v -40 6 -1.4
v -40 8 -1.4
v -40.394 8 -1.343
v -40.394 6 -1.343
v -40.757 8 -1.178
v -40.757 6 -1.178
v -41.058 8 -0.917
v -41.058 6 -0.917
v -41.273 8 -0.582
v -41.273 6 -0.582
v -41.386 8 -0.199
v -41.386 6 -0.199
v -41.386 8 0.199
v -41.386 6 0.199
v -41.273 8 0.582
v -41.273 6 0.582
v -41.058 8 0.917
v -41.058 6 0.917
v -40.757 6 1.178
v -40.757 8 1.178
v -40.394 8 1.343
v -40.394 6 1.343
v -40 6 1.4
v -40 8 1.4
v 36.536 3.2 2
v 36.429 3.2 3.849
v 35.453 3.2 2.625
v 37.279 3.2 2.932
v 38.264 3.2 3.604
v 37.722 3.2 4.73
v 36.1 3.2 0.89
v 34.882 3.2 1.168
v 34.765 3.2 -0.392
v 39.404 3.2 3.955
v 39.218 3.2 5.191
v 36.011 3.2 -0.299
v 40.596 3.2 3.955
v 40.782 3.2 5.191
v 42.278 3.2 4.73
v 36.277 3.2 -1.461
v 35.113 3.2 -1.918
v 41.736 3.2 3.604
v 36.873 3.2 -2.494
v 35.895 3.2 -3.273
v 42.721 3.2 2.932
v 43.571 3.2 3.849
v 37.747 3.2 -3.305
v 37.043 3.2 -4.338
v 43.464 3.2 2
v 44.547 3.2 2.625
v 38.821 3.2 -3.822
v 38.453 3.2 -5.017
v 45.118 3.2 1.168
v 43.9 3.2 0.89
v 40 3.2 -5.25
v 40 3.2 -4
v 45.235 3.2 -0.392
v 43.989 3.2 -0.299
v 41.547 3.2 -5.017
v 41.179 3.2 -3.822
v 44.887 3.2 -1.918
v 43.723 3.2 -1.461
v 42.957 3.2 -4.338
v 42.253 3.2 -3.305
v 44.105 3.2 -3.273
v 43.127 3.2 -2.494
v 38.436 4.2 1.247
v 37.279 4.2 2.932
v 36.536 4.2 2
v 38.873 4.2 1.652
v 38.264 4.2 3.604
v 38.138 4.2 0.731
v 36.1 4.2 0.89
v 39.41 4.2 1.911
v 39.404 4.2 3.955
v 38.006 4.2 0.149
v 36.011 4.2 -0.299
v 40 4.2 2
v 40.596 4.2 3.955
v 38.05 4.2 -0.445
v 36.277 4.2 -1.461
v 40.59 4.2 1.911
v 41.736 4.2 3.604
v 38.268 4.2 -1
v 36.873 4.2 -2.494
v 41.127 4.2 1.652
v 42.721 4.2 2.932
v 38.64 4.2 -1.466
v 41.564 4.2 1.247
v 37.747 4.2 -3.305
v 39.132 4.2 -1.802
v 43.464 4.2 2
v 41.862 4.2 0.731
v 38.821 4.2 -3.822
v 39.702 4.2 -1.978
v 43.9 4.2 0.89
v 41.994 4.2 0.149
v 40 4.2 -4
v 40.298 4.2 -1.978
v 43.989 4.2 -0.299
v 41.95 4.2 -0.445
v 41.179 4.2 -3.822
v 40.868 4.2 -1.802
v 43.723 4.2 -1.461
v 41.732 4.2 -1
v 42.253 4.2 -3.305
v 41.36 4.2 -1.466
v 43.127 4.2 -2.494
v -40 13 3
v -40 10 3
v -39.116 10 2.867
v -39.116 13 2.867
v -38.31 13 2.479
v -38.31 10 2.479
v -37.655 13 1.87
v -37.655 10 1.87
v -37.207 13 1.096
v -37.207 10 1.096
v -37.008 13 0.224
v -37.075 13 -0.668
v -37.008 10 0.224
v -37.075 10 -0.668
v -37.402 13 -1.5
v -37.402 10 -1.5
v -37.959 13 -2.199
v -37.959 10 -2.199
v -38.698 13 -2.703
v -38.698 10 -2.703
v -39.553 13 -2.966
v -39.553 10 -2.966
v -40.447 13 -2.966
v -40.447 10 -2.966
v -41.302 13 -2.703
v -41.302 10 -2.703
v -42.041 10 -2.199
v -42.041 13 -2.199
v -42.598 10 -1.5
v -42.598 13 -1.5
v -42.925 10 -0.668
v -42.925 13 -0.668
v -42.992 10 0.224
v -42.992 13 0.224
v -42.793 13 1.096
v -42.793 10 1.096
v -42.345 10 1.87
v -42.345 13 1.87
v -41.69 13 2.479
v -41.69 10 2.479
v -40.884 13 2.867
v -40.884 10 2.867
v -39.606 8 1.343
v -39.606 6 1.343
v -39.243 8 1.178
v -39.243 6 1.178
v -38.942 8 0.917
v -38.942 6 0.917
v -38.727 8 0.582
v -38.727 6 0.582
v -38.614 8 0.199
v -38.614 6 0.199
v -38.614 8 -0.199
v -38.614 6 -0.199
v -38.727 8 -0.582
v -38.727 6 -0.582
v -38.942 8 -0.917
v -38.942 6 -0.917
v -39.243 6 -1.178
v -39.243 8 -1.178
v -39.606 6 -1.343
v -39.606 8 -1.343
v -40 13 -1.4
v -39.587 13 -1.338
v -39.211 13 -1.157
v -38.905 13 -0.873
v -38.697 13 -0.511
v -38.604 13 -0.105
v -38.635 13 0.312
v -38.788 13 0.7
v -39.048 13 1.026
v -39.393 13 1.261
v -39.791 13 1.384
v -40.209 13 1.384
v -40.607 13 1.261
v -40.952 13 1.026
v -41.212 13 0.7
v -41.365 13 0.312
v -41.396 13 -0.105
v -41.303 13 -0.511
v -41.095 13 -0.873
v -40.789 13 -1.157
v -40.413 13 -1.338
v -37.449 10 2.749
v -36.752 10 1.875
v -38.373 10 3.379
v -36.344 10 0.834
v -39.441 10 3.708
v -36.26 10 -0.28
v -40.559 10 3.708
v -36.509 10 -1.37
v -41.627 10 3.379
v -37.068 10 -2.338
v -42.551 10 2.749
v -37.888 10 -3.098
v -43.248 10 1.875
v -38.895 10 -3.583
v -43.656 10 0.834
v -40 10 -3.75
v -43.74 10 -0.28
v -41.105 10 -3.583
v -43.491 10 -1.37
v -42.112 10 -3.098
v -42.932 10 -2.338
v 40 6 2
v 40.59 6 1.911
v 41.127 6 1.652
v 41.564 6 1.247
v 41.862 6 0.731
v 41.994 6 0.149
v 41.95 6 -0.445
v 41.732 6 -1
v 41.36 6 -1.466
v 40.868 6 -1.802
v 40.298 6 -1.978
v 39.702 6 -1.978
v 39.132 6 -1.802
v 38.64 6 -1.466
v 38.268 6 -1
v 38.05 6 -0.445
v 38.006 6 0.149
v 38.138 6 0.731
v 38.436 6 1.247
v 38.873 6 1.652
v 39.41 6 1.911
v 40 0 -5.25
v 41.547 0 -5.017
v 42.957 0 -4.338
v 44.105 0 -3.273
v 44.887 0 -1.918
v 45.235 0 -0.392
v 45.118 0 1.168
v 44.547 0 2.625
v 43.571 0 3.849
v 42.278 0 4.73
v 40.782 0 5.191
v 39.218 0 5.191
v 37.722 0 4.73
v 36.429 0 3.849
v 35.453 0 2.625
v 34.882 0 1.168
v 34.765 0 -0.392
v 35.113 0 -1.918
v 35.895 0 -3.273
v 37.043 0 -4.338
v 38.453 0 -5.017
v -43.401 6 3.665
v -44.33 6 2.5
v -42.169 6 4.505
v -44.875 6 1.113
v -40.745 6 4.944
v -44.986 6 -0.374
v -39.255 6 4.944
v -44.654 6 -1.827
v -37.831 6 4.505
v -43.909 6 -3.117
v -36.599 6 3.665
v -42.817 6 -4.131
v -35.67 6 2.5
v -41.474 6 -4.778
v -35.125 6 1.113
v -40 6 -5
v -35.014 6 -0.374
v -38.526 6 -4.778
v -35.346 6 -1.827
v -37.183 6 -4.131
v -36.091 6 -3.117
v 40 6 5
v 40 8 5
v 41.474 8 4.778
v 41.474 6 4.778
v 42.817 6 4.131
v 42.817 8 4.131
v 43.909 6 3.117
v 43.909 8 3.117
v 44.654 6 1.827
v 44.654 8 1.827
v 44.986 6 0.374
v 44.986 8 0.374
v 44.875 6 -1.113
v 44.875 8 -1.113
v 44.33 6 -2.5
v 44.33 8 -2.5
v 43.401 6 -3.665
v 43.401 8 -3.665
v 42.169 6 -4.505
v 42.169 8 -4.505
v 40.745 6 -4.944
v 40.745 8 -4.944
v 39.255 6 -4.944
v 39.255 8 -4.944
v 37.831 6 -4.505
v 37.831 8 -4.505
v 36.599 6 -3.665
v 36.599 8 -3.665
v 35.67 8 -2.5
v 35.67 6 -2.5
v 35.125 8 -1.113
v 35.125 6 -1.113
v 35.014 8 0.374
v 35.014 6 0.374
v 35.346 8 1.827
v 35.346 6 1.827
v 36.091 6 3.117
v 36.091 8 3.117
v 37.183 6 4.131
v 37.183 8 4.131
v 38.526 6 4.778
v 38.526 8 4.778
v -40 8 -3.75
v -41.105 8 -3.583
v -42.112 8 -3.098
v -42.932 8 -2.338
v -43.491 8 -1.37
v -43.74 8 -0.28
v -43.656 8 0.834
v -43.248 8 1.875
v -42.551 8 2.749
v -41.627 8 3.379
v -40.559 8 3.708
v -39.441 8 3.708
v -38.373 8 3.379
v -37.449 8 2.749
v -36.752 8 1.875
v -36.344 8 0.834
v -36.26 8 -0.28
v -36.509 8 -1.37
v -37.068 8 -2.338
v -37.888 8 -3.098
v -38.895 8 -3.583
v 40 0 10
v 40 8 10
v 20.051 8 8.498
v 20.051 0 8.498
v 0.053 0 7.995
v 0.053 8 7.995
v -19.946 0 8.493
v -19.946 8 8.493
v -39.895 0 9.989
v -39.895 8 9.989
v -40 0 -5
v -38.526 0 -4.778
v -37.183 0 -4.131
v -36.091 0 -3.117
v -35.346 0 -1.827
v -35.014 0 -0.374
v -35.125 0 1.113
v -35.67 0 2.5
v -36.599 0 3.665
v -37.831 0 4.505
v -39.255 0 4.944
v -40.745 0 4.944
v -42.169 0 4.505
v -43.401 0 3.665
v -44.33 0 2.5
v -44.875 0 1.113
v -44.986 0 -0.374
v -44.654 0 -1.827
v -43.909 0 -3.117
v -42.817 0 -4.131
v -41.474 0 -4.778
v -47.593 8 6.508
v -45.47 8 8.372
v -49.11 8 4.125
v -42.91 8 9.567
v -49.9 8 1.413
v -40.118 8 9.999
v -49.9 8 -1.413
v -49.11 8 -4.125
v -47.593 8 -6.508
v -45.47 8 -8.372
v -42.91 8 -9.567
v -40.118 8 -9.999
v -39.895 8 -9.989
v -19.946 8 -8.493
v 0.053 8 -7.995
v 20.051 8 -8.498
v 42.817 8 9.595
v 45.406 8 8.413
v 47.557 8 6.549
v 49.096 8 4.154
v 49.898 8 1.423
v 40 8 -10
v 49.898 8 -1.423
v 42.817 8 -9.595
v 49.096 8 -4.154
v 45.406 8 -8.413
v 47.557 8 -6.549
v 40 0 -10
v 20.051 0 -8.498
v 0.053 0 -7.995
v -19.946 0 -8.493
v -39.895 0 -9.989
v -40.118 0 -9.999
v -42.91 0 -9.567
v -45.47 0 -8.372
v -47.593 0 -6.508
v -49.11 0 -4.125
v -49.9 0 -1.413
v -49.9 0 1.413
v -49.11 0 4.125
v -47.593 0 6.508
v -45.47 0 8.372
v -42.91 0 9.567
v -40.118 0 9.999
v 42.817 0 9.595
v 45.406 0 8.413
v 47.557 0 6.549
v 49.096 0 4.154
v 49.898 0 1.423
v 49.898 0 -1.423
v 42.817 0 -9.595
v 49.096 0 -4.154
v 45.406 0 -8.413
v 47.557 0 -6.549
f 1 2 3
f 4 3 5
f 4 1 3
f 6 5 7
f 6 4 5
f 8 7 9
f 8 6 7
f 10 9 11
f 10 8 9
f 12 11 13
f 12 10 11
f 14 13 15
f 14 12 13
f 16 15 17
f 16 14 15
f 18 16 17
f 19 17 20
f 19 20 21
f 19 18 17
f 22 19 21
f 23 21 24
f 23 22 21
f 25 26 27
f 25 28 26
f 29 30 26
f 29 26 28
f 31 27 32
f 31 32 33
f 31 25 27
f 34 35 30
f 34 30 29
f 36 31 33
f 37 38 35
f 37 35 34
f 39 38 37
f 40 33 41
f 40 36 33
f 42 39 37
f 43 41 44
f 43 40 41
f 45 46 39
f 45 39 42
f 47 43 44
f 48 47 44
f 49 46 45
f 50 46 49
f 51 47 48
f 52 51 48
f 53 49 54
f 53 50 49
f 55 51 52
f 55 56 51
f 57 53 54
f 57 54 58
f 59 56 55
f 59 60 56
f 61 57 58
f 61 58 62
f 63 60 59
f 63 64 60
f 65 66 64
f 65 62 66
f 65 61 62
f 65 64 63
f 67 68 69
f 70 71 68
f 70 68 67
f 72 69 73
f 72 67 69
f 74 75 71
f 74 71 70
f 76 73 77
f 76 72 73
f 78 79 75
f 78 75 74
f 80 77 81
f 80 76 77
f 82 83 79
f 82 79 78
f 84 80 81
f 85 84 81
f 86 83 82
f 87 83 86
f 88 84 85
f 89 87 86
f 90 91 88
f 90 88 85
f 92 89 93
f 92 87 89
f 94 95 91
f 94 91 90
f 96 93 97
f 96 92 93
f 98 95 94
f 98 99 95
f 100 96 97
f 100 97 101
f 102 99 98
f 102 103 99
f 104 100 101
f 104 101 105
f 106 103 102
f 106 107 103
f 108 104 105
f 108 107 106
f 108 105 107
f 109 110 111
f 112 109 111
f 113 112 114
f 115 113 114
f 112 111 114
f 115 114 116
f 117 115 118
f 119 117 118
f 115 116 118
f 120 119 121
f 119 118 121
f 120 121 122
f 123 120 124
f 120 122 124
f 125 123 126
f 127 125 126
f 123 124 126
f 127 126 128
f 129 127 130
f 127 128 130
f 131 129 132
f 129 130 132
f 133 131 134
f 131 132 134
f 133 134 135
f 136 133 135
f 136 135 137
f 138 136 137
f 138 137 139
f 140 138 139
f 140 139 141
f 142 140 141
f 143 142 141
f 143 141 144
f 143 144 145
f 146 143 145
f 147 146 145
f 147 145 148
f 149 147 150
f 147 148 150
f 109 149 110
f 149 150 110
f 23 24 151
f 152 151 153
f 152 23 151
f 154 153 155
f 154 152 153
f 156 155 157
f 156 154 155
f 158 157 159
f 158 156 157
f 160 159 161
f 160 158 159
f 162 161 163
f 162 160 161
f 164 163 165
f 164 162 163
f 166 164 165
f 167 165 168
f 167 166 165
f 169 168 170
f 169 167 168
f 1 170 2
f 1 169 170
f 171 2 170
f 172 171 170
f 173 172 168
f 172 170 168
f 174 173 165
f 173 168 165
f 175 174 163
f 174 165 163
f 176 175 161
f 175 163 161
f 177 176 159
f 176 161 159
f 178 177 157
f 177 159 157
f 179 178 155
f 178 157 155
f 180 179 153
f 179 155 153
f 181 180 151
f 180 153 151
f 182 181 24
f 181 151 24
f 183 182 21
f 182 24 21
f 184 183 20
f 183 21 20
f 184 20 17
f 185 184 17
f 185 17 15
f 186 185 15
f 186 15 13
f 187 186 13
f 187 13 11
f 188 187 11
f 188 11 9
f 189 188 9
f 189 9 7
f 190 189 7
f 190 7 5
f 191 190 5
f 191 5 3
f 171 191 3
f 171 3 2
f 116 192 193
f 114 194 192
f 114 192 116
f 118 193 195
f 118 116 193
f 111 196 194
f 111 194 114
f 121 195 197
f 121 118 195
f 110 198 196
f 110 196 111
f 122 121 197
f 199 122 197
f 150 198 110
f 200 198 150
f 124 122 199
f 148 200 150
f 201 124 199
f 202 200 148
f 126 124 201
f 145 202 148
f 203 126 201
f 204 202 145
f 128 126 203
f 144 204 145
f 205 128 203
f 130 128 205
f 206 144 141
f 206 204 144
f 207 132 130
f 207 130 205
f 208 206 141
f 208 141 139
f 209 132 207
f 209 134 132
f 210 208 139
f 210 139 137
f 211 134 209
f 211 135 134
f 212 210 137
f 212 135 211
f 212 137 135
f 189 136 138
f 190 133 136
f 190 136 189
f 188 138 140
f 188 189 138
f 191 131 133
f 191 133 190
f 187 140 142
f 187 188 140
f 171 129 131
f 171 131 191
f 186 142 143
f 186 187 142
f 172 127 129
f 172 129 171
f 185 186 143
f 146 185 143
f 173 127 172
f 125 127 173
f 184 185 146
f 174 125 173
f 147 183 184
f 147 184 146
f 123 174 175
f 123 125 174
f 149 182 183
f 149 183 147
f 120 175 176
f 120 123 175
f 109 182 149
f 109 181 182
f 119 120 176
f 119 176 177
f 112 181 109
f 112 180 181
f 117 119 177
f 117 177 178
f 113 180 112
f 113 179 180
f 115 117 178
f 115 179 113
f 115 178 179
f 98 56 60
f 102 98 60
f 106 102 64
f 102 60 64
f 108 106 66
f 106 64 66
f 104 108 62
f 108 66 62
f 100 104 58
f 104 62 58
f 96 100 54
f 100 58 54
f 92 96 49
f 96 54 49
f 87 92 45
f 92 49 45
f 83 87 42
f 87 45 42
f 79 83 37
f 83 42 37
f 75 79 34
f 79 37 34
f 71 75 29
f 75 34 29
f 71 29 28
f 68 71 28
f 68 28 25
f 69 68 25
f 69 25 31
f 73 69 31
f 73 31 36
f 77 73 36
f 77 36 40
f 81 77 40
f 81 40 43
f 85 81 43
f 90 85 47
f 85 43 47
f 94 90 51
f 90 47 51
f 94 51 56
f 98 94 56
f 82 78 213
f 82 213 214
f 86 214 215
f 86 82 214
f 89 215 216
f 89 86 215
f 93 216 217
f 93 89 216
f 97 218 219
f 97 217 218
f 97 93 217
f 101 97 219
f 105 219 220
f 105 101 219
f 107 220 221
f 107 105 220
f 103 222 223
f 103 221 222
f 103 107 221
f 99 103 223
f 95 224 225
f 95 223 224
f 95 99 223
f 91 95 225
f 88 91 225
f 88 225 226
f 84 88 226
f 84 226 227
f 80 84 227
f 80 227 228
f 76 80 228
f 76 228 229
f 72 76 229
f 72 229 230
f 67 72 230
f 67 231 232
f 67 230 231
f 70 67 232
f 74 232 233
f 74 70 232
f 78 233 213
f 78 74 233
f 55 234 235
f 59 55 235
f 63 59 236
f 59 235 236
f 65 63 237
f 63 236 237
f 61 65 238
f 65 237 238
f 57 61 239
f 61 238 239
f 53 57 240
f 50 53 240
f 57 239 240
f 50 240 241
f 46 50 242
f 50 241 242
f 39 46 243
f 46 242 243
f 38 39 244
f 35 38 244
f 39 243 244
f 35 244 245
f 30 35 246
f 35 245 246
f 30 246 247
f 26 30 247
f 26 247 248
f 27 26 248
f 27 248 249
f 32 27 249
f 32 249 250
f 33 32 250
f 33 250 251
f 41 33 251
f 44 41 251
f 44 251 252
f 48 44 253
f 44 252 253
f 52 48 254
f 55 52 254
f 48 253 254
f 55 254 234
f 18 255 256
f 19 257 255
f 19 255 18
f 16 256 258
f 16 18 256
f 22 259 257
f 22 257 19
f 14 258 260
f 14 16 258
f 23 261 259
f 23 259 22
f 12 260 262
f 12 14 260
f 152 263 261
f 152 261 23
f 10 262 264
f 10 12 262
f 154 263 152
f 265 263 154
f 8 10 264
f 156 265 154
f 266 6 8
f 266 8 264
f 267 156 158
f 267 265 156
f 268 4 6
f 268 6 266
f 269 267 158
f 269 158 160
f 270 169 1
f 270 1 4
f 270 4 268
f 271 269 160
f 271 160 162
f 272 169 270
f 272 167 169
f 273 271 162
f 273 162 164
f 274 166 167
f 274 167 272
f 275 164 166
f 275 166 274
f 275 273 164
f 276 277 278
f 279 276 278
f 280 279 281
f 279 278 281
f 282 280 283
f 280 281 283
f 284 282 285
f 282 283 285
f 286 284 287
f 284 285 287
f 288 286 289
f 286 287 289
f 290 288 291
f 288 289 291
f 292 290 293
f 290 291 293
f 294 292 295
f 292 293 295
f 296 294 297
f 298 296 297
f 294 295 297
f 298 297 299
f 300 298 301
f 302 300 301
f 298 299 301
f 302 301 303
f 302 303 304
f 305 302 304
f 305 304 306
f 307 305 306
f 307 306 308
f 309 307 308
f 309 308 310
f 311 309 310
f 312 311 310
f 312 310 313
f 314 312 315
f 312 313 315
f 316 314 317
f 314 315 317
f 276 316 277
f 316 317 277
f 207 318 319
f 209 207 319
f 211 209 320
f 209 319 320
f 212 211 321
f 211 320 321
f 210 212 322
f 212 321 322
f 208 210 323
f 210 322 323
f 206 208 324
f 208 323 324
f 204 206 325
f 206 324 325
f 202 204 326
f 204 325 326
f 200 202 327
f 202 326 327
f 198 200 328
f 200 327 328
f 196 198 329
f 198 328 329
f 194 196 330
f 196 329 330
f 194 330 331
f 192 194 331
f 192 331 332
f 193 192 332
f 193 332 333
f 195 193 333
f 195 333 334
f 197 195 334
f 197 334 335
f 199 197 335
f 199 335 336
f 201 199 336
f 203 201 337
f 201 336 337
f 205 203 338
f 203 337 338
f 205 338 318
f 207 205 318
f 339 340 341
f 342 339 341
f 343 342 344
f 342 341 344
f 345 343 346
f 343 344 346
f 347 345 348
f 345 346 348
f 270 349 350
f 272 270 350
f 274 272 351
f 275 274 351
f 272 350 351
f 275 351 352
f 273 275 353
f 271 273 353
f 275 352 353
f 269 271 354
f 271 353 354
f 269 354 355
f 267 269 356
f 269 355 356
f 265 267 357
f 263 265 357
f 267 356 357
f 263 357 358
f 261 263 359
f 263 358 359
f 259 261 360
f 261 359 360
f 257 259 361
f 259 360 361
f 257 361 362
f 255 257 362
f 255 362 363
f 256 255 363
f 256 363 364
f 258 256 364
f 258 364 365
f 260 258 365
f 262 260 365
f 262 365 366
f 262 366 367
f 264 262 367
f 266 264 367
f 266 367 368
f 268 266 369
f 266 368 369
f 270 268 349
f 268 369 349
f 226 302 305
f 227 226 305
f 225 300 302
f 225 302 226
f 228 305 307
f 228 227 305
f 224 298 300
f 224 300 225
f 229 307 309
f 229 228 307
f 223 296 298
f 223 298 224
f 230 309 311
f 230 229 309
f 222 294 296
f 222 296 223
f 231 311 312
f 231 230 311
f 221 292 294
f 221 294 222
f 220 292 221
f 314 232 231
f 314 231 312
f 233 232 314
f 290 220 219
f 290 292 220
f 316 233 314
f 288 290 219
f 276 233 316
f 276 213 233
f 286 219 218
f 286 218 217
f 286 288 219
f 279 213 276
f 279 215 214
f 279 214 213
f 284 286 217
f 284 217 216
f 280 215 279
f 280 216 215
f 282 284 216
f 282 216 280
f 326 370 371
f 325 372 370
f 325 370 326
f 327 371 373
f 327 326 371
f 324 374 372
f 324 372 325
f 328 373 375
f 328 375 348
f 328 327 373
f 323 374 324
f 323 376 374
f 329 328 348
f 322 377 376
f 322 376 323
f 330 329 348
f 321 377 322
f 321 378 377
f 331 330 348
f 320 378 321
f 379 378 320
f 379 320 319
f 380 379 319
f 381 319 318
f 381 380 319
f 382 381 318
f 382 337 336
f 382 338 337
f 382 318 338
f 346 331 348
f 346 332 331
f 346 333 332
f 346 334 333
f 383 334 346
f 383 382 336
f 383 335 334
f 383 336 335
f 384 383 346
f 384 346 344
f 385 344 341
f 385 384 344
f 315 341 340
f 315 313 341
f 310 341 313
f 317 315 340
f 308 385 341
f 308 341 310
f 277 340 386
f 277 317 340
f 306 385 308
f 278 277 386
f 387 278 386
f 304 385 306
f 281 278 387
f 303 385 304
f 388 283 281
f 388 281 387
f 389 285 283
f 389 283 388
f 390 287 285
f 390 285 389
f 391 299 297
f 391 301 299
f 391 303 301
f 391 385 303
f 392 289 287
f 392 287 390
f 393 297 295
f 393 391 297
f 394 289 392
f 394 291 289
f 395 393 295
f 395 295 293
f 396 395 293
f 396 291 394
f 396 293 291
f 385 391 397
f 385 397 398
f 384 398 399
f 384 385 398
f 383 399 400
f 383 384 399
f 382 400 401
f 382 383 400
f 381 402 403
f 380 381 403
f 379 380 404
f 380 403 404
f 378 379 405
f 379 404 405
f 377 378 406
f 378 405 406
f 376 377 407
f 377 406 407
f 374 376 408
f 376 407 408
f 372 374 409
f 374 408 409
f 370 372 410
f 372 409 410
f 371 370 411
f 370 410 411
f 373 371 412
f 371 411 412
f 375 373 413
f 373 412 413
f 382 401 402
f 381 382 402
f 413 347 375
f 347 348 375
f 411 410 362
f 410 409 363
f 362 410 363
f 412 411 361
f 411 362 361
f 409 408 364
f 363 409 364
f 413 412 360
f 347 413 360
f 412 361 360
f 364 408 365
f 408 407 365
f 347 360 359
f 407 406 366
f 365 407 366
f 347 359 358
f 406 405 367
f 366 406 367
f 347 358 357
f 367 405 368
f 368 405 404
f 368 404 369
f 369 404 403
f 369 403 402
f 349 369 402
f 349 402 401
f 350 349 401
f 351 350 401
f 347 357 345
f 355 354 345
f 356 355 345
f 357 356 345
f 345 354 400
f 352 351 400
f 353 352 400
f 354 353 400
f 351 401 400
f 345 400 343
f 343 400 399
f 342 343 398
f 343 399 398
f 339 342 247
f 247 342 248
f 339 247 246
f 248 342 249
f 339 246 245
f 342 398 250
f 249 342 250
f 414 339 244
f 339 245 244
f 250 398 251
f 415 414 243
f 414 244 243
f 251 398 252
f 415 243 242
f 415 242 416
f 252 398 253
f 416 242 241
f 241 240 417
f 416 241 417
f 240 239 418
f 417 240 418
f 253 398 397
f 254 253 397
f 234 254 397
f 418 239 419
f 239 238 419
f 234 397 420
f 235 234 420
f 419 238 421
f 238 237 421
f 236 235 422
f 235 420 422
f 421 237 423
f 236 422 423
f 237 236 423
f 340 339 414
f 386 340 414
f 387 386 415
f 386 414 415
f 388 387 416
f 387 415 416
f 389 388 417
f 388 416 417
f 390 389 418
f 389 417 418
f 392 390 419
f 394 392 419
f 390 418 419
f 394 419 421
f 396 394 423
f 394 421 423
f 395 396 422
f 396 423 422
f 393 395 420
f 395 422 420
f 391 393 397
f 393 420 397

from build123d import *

# Parameters (mm, degrees)
SKETCH1_R           = 1.4
SKETCH1_R_2         = 2
BOSS_EXTRUDE1_DEPTH = 8
SKETCH2_R           = 3.75
BOSS_EXTRUDE2_DEPTH = 2
SKETCH3_R           = 3
BOSS_EXTRUDE3_DEPTH = 3
SKETCH4_R           = 1.4
CUT_EXTRUDE1_DEPTH  = 53.621288468
SKETCH5_R           = 5
CUT_EXTRUDE2_DEPTH  = 6
SKETCH6_R           = 5.25
CUT_EXTRUDE3_DEPTH  = 3.2
SKETCH7_R           = 5
CUT_EXTRUDE4_DEPTH  = 2
SKETCH8_R           = 4
CUT_EXTRUDE5_DEPTH  = 1
CUT_EXTRUDE6_DEPTH  = 52.613951602
FILLET1_R           = 2


with BuildPart() as part:
    # Sketch1 → Boss-Extrude1 (new body)
    with BuildSketch(Plane(origin=(0, 0, 0), x_dir=(1, 0, 0), z_dir=(0, 1, 0))):
        with BuildLine():
            Line((-40, -10), (40, -10))
            ThreePointArc((40, -10), (50, 0), (40, 10))
            Line((40, 10), (-40, 10))
            ThreePointArc((-40, 10), (-50, 0), (-40, -10))
        make_face()
        with Locations(Location((-40, 0, 0), (0, 0, 270))):
            Circle(SKETCH1_R, mode=Mode.SUBTRACT)
        with Locations(Location((40, 0, 0), (0, 0, 270))):
            Circle(SKETCH1_R_2, mode=Mode.SUBTRACT)
    extrude(amount=BOSS_EXTRUDE1_DEPTH)

    # Sketch2 → Boss-Extrude2 (add)
    with BuildSketch(Plane(origin=(0, 8, 0), x_dir=(1, 0, 0), z_dir=(0, 1, 0))):
        with Locations(Location((-40, 0, 0), (0, 0, 90))):
            Circle(SKETCH2_R)
    extrude(amount=BOSS_EXTRUDE2_DEPTH)

    # Sketch3 → Boss-Extrude3 (add)
    with BuildSketch(Plane(origin=(0, 10, 0), x_dir=(1, 0, 0), z_dir=(0, 1, 0))):
        with Locations(Location((-40, 0, 0), (0, 0, 270))):
            Circle(SKETCH3_R)
    extrude(amount=BOSS_EXTRUDE3_DEPTH)

    # Sketch4 → Cut-Extrude1 (cut, through all)
    with BuildSketch(Plane.XZ):
        with Locations(Location((-40, 0, 0), (0, 0, 270))):
            Circle(SKETCH4_R)
    extrude(amount=-CUT_EXTRUDE1_DEPTH, mode=Mode.SUBTRACT)

    # Sketch5 → Cut-Extrude2 (cut)
    with BuildSketch(Plane.XZ):
        with Locations(Location((-40, 0, 0), (0, 0, 270))):
            Circle(SKETCH5_R)
    extrude(amount=-CUT_EXTRUDE2_DEPTH, mode=Mode.SUBTRACT)

    # Sketch6 → Cut-Extrude3 (cut)
    with BuildSketch(Plane.XZ):
        with Locations(Location((40, 0, 0), (0, 0, 270))):
            Circle(SKETCH6_R)
    extrude(amount=-CUT_EXTRUDE3_DEPTH, mode=Mode.SUBTRACT)

    # Sketch7 → Cut-Extrude4 (cut)
    with BuildSketch(Plane(origin=(0, 8, 0), x_dir=(1, 0, 0), z_dir=(0, 1, 0))):
        with Locations(Location((40, 0, 0), (0, 0, 270))):
            Circle(SKETCH7_R)
    extrude(amount=-CUT_EXTRUDE4_DEPTH, mode=Mode.SUBTRACT)

    # Sketch8 → Cut-Extrude5 (cut)
    with BuildSketch(Plane.XZ.offset(-3.2)):
        with Locations(Location((40, 0, 0), (0, 0, 270))):
            Circle(SKETCH8_R)
    extrude(amount=-CUT_EXTRUDE5_DEPTH, mode=Mode.SUBTRACT)

    # Sketch9 → Cut-Extrude6 (cut, symmetric)
    with BuildSketch(Plane(origin=(0, 8, 0), x_dir=(1, 0, 0), z_dir=(0, 1, 0))):
        with BuildLine():
            Line((-40, 10), (40, 10))
            ThreePointArc((40, 10), (0, 7.994974843), (-40, 10))
        make_face()
    cut_extrude6 = extrude(amount=CUT_EXTRUDE6_DEPTH, both=True, mode=Mode.SUBTRACT)

    # Mirror1: Cut-Extrude6 across plane
    add(cut_extrude6.mirror(Plane.XY), mode=Mode.SUBTRACT)

    # Fillet1
    fillet1_edges = [part.edges().sort_by_distance(p)[0] for p in [
        (-40, 4, 10),
        (-40, 4, -10),
    ]]
    fillet(fillet1_edges, radius=FILLET1_R)


solid = part.part
